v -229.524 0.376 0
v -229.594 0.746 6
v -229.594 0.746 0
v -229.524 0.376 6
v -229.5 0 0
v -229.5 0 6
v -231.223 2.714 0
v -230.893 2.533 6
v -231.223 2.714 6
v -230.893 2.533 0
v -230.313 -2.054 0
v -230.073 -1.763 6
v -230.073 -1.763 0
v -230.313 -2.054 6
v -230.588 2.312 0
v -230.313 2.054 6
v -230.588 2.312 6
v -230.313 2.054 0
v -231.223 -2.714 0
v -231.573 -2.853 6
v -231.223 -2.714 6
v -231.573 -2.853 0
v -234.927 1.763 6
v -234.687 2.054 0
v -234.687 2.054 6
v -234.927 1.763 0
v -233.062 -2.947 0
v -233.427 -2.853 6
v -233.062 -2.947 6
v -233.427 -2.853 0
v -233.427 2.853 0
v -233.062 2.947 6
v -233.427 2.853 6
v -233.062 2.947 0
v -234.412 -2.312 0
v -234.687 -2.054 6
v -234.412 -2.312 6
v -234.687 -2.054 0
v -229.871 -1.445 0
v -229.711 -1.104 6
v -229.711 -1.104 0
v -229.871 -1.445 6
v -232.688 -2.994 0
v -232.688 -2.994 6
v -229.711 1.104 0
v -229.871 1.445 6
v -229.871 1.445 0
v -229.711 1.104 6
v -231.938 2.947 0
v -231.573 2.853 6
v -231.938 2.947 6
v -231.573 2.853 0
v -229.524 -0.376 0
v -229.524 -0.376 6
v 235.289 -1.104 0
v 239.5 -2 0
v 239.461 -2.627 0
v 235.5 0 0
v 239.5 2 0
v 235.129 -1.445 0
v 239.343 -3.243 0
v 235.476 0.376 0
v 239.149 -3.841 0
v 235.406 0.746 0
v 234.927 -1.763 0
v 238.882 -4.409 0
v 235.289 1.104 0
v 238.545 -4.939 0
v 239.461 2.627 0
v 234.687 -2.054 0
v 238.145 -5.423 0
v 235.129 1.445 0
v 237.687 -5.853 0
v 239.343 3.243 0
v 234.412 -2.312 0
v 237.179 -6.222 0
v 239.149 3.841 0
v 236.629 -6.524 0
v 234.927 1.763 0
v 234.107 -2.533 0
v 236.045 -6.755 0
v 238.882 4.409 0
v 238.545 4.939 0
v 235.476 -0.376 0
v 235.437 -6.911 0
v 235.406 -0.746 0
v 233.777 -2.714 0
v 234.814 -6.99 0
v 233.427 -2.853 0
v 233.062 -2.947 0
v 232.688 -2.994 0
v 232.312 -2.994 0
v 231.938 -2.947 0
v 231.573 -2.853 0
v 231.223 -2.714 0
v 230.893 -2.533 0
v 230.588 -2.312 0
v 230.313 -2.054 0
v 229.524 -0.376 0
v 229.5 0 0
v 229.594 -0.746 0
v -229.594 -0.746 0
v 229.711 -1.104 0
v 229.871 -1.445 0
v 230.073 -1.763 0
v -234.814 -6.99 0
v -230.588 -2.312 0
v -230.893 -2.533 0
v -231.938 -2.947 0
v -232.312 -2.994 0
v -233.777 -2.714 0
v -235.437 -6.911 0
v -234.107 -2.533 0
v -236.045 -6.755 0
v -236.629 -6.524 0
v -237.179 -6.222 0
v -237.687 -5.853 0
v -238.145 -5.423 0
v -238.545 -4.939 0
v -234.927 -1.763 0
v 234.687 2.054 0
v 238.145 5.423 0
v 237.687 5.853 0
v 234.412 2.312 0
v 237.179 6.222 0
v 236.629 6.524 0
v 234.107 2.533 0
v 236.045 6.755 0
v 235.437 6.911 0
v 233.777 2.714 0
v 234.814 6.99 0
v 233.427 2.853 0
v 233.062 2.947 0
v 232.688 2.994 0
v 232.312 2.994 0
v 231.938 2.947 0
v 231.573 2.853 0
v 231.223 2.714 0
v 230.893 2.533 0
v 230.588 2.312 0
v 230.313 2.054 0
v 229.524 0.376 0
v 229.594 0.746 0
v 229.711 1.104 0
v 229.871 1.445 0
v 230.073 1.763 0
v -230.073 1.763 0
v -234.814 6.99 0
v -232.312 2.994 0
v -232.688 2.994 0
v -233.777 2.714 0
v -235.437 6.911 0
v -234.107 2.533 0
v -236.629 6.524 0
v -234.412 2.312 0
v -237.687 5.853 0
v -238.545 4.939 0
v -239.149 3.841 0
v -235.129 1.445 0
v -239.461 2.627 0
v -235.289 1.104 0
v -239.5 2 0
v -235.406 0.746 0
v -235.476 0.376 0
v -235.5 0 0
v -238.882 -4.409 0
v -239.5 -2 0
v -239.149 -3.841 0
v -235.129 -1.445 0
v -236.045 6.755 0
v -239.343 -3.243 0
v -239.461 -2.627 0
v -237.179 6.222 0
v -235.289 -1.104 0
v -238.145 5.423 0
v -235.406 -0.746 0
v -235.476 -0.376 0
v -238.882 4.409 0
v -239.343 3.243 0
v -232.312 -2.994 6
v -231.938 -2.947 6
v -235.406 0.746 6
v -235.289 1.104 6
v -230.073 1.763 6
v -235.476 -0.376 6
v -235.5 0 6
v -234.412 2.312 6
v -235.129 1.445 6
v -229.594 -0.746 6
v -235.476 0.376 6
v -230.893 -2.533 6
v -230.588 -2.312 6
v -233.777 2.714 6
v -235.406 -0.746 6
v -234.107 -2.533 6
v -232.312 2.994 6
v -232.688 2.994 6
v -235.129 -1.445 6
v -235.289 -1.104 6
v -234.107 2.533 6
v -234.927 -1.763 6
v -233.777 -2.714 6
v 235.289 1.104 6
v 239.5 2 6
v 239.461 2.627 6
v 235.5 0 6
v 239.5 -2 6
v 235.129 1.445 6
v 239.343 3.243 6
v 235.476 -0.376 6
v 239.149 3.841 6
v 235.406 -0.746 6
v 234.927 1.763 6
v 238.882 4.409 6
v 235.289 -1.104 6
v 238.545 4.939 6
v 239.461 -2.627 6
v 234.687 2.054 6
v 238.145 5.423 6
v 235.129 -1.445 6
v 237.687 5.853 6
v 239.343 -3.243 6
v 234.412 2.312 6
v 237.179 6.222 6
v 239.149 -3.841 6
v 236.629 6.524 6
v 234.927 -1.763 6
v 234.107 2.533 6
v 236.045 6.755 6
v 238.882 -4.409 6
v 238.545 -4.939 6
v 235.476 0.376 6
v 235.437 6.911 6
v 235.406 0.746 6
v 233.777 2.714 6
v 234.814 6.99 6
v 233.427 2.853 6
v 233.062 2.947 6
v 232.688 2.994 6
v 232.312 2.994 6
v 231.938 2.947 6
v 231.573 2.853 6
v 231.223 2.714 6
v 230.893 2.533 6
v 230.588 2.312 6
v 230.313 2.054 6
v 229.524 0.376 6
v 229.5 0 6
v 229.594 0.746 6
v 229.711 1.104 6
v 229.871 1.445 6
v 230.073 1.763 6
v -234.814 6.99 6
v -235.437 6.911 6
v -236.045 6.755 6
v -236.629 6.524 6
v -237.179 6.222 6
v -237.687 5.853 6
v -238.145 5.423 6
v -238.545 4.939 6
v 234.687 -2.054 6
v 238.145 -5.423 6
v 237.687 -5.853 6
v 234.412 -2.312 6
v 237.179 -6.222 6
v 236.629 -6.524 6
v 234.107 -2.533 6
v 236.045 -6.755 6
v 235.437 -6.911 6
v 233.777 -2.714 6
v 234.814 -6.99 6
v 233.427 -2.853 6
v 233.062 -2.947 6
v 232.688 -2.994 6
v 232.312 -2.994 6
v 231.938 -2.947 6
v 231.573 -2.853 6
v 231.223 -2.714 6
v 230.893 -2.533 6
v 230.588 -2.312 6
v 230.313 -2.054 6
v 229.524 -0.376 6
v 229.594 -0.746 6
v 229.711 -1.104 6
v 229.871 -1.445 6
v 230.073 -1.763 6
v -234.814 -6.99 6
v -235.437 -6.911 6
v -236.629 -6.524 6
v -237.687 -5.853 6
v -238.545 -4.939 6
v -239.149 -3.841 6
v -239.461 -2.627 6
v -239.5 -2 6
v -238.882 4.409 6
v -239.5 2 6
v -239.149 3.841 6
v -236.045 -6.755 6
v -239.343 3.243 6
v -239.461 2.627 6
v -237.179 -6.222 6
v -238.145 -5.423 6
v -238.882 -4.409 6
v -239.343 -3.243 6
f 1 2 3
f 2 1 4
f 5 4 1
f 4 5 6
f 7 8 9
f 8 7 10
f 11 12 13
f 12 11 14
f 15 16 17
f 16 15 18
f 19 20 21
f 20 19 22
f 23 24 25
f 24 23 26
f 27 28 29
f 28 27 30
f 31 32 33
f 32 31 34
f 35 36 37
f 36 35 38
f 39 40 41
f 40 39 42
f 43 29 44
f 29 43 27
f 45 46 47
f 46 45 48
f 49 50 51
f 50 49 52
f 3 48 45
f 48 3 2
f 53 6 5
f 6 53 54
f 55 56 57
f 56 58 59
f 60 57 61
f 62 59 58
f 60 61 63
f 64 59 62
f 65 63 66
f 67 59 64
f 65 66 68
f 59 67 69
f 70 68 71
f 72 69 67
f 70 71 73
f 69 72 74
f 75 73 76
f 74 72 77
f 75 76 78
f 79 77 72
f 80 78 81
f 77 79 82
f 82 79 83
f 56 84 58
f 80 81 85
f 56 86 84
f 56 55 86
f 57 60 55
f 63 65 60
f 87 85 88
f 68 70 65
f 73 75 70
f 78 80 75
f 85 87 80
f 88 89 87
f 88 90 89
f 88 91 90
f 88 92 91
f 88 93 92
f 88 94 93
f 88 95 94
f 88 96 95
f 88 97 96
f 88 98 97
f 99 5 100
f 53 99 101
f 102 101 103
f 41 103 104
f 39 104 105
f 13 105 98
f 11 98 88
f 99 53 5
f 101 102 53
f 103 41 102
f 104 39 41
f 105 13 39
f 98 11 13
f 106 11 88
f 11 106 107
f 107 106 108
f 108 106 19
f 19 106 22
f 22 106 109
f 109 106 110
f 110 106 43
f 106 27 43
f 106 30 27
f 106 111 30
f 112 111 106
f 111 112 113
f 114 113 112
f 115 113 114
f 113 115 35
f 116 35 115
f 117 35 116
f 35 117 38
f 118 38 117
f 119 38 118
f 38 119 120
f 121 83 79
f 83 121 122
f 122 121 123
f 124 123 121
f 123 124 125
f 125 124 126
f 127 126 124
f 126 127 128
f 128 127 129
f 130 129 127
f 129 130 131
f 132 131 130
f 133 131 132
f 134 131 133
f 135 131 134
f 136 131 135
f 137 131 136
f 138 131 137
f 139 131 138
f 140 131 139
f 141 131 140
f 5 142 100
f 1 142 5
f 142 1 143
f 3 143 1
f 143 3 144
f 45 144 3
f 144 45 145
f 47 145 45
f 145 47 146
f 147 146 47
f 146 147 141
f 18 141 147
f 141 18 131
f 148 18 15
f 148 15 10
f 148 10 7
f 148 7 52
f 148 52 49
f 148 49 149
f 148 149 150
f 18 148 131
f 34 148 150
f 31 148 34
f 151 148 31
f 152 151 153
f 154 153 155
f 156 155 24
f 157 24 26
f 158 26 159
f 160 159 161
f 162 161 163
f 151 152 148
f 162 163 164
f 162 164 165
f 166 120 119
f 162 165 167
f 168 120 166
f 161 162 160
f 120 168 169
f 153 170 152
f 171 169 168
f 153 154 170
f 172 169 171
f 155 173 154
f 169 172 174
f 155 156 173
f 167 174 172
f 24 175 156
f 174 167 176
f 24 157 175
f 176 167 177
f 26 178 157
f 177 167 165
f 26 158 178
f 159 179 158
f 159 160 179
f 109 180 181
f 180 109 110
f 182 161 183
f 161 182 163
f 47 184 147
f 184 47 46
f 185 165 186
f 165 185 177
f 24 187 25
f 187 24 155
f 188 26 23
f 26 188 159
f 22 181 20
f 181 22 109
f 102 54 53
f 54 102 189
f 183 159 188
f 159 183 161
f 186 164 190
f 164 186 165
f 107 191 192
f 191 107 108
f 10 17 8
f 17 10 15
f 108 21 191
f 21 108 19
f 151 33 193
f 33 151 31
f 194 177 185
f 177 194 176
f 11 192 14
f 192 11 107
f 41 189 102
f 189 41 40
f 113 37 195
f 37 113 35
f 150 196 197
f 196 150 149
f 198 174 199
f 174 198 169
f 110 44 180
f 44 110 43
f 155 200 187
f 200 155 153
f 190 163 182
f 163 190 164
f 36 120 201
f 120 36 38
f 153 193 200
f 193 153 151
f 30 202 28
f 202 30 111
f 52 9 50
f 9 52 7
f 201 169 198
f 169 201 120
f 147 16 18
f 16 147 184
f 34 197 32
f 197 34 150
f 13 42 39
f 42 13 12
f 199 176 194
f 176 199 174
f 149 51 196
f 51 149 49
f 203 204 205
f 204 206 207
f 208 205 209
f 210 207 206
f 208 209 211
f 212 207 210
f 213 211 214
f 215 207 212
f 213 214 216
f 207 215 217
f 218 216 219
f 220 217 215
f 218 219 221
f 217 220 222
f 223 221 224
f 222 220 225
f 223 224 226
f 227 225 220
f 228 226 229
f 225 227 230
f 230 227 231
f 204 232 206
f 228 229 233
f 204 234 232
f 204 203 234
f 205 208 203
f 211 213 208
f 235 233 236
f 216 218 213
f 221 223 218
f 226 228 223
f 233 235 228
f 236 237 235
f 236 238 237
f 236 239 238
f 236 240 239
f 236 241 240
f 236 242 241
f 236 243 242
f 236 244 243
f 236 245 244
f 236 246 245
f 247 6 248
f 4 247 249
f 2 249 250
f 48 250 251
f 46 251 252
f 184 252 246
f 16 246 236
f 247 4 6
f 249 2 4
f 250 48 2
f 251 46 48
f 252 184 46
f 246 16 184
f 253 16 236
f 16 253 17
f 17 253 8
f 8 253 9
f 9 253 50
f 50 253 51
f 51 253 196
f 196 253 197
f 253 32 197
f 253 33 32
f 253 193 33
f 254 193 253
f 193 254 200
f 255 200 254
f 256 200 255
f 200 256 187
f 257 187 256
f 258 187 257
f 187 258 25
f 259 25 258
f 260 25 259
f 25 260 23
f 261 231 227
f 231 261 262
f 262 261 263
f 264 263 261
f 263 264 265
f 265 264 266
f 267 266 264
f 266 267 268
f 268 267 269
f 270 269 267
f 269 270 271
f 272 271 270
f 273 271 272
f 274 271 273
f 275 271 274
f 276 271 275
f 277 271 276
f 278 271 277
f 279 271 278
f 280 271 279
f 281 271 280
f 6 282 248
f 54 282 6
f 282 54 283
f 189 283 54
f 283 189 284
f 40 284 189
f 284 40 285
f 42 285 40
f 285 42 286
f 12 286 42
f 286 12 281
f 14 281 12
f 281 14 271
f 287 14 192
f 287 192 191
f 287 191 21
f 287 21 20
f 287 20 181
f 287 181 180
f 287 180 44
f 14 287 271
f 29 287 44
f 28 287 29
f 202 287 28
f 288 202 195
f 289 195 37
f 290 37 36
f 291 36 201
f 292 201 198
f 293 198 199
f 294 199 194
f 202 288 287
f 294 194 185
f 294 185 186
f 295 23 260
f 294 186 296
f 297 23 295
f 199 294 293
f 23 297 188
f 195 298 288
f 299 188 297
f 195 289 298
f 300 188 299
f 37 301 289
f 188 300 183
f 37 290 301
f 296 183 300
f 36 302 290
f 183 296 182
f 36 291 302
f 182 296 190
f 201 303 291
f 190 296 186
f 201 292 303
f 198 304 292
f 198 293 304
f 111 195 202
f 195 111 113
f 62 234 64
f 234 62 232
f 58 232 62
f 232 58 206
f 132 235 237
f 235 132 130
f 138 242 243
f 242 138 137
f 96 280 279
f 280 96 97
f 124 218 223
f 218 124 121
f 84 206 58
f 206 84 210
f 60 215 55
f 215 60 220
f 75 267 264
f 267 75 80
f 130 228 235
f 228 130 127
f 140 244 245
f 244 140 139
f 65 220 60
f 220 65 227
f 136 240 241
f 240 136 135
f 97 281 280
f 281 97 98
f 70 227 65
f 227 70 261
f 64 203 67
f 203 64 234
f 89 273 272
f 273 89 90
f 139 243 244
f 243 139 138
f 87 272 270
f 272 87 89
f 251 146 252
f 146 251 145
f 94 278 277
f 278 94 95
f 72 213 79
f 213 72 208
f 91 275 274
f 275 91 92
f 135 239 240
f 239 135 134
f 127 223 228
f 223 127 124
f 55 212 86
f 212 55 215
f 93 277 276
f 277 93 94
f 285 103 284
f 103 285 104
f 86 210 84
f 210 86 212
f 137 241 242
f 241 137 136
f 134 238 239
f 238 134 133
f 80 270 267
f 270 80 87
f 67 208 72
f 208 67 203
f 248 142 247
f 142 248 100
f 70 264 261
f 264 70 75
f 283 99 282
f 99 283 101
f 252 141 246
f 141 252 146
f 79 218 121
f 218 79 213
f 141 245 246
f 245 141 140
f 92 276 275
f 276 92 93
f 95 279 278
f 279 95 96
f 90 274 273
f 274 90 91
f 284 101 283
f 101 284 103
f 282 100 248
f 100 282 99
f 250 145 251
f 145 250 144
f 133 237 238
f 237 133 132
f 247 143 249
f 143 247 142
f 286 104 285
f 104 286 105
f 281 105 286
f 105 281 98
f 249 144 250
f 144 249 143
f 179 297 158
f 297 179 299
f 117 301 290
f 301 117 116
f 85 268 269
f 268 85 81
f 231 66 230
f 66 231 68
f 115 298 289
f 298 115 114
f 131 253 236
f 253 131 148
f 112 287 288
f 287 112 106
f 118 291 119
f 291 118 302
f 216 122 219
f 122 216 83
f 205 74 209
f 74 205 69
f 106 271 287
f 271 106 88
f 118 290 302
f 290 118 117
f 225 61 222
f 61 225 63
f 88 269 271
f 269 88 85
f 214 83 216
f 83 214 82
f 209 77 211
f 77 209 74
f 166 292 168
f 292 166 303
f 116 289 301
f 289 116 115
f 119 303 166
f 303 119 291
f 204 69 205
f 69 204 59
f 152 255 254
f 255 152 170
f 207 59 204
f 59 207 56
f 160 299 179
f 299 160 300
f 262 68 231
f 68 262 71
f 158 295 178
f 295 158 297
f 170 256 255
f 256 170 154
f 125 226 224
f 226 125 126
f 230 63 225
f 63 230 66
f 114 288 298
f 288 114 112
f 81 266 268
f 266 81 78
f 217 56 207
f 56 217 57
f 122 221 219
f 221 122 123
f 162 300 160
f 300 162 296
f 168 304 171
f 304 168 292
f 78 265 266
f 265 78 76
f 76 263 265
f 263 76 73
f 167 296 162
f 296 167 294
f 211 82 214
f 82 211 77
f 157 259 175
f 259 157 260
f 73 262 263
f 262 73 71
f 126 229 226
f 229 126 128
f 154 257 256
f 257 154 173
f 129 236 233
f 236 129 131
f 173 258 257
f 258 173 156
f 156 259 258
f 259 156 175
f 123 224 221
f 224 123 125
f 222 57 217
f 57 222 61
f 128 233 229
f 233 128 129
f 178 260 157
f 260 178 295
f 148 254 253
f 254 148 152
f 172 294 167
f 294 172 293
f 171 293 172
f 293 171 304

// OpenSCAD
$fn = 50;


difference() {
	union() {
		hull() {
			translate(v = [-234.5000000000, 2.0000000000, 0]) {
				cylinder(h = 6, r = 5);
			}
			translate(v = [234.5000000000, 2.0000000000, 0]) {
				cylinder(h = 6, r = 5);
			}
			translate(v = [-234.5000000000, -2.0000000000, 0]) {
				cylinder(h = 6, r = 5);
			}
			translate(v = [234.5000000000, -2.0000000000, 0]) {
				cylinder(h = 6, r = 5);
			}
		}
	}
	union() {
		translate(v = [-232.5000000000, 0.0000000000, 0]) {
			cylinder(h = 6, r = 3.0000000000);
		}
		translate(v = [232.5000000000, 0.0000000000, 0]) {
			cylinder(h = 6, r = 3.0000000000);
		}
		translate(v = [-232.5000000000, 0.0000000000, 0]) {
			cylinder(h = 6, r = 1.5000000000);
		}
		translate(v = [232.5000000000, 0.0000000000, 0]) {
			cylinder(h = 6, r = 1.5000000000);
		}
		translate(v = [-232.5000000000, 0.0000000000, 0]) {
			cylinder(h = 6, r = 1.5000000000);
		}
		translate(v = [232.5000000000, 0.0000000000, 0]) {
			cylinder(h = 6, r = 1.5000000000);
		}
		translate(v = [-232.5000000000, 0.0000000000, 0]) {
			cylinder(h = 6, r = 1.5000000000);
		}
		translate(v = [232.5000000000, 0.0000000000, 0]) {
			cylinder(h = 6, r = 1.5000000000);
		}
	}
}
